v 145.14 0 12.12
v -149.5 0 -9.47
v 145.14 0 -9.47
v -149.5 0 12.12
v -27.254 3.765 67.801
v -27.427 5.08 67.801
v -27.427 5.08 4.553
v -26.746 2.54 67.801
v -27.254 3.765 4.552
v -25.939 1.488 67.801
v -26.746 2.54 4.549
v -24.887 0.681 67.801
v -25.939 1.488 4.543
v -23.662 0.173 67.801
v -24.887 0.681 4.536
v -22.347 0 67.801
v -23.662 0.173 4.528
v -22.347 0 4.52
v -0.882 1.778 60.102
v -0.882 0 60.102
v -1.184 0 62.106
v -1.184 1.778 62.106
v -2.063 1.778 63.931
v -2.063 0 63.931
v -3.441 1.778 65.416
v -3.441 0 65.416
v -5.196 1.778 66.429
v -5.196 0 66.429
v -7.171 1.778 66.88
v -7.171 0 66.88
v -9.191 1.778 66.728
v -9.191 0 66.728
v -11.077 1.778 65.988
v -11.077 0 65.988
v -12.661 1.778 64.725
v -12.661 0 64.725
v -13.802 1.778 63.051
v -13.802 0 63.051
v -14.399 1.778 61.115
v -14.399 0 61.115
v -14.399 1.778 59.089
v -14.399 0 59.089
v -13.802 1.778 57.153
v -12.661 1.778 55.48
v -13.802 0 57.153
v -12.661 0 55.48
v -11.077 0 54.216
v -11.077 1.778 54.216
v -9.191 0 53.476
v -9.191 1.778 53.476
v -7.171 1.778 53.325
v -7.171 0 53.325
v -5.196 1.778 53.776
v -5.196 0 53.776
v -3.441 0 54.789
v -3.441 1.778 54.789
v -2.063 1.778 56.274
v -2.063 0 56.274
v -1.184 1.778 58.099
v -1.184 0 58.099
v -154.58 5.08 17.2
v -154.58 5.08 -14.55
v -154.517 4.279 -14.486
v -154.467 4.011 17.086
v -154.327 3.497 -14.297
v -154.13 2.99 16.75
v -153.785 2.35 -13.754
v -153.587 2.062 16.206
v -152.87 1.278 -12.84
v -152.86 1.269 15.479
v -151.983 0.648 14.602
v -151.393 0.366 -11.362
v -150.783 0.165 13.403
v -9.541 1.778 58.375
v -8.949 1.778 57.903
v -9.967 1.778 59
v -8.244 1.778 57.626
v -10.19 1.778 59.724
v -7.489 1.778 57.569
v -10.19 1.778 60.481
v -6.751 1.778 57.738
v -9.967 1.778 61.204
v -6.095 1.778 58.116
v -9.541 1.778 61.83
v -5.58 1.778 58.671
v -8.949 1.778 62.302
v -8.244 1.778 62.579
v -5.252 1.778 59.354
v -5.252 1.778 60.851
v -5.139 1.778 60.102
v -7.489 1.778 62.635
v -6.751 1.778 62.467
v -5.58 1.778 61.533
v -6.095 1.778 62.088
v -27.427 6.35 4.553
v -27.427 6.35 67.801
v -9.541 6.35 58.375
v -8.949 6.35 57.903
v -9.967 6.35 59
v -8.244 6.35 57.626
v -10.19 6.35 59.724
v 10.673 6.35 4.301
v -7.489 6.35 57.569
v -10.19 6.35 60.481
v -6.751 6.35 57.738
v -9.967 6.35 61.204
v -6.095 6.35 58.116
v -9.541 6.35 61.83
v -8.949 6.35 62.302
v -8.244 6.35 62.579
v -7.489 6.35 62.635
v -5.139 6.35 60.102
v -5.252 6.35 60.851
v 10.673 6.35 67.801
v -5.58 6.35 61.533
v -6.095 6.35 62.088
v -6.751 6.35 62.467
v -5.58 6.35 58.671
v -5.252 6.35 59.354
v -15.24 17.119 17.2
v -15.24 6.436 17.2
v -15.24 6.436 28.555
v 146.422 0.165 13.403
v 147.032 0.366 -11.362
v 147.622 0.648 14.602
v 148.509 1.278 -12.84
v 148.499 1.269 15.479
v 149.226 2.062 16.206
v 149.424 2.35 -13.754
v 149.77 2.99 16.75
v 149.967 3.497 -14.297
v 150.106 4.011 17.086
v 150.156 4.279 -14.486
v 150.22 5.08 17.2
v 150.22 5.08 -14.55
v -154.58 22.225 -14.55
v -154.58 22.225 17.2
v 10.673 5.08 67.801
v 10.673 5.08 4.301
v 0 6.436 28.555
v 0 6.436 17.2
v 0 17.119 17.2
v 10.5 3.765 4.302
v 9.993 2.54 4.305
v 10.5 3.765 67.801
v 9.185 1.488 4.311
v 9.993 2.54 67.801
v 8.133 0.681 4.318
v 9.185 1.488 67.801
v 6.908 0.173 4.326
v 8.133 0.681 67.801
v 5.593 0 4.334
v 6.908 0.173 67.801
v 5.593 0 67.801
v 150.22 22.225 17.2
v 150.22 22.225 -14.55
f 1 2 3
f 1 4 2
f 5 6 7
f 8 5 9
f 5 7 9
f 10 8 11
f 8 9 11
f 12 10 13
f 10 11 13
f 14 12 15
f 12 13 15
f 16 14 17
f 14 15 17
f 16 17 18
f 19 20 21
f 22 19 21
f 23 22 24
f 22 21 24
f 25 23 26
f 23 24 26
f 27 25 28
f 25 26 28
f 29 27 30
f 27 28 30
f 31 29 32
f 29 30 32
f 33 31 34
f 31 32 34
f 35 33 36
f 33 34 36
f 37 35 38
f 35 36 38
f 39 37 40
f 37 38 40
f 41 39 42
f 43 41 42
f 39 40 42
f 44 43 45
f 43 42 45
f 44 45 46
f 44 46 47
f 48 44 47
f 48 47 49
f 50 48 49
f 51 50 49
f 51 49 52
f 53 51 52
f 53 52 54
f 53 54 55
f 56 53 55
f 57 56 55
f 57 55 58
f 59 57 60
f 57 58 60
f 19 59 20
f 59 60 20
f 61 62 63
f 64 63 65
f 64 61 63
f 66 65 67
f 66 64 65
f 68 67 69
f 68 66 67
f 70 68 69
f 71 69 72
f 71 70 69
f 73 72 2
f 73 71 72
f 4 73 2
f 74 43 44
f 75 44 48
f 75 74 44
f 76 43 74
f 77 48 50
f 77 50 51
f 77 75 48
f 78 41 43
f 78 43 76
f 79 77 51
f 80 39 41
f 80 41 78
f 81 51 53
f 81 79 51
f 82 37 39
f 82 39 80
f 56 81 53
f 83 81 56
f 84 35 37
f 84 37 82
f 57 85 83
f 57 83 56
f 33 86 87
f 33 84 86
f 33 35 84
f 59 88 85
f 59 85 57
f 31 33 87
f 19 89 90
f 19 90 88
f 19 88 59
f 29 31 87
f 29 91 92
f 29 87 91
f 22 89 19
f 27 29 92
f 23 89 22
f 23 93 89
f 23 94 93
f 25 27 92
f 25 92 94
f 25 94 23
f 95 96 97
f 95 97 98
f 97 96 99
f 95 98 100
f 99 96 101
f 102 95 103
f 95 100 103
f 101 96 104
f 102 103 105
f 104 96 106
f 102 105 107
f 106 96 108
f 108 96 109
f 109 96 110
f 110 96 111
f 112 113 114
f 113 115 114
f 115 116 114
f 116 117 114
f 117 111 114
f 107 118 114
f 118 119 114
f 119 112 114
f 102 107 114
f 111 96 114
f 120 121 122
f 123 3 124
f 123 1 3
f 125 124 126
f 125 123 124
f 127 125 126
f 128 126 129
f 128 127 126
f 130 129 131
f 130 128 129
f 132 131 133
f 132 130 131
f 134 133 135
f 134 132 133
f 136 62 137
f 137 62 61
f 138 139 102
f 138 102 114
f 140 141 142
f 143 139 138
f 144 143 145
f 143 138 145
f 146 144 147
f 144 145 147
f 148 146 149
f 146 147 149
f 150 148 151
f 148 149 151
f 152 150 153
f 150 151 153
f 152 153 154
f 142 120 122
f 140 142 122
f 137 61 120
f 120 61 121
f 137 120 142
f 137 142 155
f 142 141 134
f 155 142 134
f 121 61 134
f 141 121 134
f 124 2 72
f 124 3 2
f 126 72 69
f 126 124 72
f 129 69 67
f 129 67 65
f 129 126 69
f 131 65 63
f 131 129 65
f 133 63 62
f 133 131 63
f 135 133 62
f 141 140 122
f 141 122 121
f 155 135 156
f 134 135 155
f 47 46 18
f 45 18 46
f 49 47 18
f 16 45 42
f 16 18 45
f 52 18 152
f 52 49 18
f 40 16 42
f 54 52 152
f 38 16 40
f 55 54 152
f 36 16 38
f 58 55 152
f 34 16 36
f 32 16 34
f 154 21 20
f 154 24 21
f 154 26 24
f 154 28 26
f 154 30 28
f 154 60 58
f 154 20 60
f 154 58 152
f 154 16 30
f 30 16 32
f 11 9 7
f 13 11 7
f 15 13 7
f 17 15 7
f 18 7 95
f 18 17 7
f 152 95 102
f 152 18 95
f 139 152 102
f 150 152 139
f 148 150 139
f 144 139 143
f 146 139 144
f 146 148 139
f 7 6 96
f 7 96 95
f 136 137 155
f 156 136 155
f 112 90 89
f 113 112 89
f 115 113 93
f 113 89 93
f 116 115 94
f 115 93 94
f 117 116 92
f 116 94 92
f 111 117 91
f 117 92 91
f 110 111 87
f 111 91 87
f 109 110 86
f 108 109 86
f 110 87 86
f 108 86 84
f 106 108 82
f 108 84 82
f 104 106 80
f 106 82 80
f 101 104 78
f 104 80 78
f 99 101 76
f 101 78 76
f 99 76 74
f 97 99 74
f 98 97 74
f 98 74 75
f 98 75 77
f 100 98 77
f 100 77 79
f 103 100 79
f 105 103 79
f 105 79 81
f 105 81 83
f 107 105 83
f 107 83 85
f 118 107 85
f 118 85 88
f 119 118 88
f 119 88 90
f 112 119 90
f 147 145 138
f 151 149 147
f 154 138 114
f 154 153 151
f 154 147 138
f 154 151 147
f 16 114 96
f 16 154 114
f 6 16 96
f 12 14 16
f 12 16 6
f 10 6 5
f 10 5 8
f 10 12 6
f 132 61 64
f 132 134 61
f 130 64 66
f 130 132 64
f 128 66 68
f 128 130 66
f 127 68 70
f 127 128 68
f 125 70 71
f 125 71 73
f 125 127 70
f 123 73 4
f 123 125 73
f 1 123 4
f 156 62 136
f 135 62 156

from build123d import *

# Parameters (mm, degrees)
F0_W     = 304.8
F0_H     = 31.75
F1_DEPTH = 22.225
F3_DEPTH = 6.35
F4_R     = 2.54
F5_DEPTH = 25.4
F4_R_2   = 6.796471
F6_DEPTH = 1.778
F9_DEPTH = 15.24
F10_R    = 5.08
F10_2_R  = 5.08


with BuildPart() as f1:
    # F0 (on Front) → F1 (new body)
    with BuildSketch(Plane.XZ):
        with Locations((-2.180368, 1.324904)):
            Rectangle(F0_W, F0_H)
    extrude(amount=-F1_DEPTH)

    # F8 (on offset) → F9 (join)
    with BuildSketch(Plane.YZ.offset(-15.24)):
        Polygon((17.156105, 17.160587), (6.436161, 28.554743), (6.436161, 17.160587), align=None)
    extrude(amount=F9_DEPTH)

    # F10#2
    f10_2_edges = [f1.edges().sort_by_distance(p)[0] for p in [
        (-2.180368, 0, -14.550096),
        (-2.180368, 0, 17.199904),
        (150.219632, 0, 1.324904),
        (-154.580368, 0, 1.324904),
    ]]
    fillet(f10_2_edges, radius=F10_2_R)


with BuildPart() as f3:
    # F2 (on Front) → F3 (new body)
    with BuildSketch(Plane.XZ):
        Polygon((10.673112, 67.800656), (-27.426888, 67.800656), (-27.426888, 4.553341), (10.673112, 4.300656), align=None)
    extrude(amount=-F3_DEPTH)

    # F4 (on Front) → F5 (cut)
    with BuildSketch(Plane.XZ):
        with Locations((-7.678686, 60.102299)):
            Circle(F4_R)
    extrude(amount=-F5_DEPTH, mode=Mode.SUBTRACT)

    # F4 (on Front) → F6 (cut)
    with BuildSketch(Plane.XZ):
        with Locations((-7.678686, 60.102299)):
            Circle(F4_R_2)
        with Locations((-7.678686, 60.102299)):
            Circle(F4_R, mode=Mode.SUBTRACT)
    extrude(amount=-F6_DEPTH, mode=Mode.SUBTRACT)

    # F10
    f10_edges = [f3.edges().sort_by_distance(p)[0] for p in [
        (10.673112, 0, 36.050656),
        (-27.426888, 0, 36.176998),
    ]]
    fillet(f10_edges, radius=F10_R)


solid = Compound([f1.part, f3.part])
